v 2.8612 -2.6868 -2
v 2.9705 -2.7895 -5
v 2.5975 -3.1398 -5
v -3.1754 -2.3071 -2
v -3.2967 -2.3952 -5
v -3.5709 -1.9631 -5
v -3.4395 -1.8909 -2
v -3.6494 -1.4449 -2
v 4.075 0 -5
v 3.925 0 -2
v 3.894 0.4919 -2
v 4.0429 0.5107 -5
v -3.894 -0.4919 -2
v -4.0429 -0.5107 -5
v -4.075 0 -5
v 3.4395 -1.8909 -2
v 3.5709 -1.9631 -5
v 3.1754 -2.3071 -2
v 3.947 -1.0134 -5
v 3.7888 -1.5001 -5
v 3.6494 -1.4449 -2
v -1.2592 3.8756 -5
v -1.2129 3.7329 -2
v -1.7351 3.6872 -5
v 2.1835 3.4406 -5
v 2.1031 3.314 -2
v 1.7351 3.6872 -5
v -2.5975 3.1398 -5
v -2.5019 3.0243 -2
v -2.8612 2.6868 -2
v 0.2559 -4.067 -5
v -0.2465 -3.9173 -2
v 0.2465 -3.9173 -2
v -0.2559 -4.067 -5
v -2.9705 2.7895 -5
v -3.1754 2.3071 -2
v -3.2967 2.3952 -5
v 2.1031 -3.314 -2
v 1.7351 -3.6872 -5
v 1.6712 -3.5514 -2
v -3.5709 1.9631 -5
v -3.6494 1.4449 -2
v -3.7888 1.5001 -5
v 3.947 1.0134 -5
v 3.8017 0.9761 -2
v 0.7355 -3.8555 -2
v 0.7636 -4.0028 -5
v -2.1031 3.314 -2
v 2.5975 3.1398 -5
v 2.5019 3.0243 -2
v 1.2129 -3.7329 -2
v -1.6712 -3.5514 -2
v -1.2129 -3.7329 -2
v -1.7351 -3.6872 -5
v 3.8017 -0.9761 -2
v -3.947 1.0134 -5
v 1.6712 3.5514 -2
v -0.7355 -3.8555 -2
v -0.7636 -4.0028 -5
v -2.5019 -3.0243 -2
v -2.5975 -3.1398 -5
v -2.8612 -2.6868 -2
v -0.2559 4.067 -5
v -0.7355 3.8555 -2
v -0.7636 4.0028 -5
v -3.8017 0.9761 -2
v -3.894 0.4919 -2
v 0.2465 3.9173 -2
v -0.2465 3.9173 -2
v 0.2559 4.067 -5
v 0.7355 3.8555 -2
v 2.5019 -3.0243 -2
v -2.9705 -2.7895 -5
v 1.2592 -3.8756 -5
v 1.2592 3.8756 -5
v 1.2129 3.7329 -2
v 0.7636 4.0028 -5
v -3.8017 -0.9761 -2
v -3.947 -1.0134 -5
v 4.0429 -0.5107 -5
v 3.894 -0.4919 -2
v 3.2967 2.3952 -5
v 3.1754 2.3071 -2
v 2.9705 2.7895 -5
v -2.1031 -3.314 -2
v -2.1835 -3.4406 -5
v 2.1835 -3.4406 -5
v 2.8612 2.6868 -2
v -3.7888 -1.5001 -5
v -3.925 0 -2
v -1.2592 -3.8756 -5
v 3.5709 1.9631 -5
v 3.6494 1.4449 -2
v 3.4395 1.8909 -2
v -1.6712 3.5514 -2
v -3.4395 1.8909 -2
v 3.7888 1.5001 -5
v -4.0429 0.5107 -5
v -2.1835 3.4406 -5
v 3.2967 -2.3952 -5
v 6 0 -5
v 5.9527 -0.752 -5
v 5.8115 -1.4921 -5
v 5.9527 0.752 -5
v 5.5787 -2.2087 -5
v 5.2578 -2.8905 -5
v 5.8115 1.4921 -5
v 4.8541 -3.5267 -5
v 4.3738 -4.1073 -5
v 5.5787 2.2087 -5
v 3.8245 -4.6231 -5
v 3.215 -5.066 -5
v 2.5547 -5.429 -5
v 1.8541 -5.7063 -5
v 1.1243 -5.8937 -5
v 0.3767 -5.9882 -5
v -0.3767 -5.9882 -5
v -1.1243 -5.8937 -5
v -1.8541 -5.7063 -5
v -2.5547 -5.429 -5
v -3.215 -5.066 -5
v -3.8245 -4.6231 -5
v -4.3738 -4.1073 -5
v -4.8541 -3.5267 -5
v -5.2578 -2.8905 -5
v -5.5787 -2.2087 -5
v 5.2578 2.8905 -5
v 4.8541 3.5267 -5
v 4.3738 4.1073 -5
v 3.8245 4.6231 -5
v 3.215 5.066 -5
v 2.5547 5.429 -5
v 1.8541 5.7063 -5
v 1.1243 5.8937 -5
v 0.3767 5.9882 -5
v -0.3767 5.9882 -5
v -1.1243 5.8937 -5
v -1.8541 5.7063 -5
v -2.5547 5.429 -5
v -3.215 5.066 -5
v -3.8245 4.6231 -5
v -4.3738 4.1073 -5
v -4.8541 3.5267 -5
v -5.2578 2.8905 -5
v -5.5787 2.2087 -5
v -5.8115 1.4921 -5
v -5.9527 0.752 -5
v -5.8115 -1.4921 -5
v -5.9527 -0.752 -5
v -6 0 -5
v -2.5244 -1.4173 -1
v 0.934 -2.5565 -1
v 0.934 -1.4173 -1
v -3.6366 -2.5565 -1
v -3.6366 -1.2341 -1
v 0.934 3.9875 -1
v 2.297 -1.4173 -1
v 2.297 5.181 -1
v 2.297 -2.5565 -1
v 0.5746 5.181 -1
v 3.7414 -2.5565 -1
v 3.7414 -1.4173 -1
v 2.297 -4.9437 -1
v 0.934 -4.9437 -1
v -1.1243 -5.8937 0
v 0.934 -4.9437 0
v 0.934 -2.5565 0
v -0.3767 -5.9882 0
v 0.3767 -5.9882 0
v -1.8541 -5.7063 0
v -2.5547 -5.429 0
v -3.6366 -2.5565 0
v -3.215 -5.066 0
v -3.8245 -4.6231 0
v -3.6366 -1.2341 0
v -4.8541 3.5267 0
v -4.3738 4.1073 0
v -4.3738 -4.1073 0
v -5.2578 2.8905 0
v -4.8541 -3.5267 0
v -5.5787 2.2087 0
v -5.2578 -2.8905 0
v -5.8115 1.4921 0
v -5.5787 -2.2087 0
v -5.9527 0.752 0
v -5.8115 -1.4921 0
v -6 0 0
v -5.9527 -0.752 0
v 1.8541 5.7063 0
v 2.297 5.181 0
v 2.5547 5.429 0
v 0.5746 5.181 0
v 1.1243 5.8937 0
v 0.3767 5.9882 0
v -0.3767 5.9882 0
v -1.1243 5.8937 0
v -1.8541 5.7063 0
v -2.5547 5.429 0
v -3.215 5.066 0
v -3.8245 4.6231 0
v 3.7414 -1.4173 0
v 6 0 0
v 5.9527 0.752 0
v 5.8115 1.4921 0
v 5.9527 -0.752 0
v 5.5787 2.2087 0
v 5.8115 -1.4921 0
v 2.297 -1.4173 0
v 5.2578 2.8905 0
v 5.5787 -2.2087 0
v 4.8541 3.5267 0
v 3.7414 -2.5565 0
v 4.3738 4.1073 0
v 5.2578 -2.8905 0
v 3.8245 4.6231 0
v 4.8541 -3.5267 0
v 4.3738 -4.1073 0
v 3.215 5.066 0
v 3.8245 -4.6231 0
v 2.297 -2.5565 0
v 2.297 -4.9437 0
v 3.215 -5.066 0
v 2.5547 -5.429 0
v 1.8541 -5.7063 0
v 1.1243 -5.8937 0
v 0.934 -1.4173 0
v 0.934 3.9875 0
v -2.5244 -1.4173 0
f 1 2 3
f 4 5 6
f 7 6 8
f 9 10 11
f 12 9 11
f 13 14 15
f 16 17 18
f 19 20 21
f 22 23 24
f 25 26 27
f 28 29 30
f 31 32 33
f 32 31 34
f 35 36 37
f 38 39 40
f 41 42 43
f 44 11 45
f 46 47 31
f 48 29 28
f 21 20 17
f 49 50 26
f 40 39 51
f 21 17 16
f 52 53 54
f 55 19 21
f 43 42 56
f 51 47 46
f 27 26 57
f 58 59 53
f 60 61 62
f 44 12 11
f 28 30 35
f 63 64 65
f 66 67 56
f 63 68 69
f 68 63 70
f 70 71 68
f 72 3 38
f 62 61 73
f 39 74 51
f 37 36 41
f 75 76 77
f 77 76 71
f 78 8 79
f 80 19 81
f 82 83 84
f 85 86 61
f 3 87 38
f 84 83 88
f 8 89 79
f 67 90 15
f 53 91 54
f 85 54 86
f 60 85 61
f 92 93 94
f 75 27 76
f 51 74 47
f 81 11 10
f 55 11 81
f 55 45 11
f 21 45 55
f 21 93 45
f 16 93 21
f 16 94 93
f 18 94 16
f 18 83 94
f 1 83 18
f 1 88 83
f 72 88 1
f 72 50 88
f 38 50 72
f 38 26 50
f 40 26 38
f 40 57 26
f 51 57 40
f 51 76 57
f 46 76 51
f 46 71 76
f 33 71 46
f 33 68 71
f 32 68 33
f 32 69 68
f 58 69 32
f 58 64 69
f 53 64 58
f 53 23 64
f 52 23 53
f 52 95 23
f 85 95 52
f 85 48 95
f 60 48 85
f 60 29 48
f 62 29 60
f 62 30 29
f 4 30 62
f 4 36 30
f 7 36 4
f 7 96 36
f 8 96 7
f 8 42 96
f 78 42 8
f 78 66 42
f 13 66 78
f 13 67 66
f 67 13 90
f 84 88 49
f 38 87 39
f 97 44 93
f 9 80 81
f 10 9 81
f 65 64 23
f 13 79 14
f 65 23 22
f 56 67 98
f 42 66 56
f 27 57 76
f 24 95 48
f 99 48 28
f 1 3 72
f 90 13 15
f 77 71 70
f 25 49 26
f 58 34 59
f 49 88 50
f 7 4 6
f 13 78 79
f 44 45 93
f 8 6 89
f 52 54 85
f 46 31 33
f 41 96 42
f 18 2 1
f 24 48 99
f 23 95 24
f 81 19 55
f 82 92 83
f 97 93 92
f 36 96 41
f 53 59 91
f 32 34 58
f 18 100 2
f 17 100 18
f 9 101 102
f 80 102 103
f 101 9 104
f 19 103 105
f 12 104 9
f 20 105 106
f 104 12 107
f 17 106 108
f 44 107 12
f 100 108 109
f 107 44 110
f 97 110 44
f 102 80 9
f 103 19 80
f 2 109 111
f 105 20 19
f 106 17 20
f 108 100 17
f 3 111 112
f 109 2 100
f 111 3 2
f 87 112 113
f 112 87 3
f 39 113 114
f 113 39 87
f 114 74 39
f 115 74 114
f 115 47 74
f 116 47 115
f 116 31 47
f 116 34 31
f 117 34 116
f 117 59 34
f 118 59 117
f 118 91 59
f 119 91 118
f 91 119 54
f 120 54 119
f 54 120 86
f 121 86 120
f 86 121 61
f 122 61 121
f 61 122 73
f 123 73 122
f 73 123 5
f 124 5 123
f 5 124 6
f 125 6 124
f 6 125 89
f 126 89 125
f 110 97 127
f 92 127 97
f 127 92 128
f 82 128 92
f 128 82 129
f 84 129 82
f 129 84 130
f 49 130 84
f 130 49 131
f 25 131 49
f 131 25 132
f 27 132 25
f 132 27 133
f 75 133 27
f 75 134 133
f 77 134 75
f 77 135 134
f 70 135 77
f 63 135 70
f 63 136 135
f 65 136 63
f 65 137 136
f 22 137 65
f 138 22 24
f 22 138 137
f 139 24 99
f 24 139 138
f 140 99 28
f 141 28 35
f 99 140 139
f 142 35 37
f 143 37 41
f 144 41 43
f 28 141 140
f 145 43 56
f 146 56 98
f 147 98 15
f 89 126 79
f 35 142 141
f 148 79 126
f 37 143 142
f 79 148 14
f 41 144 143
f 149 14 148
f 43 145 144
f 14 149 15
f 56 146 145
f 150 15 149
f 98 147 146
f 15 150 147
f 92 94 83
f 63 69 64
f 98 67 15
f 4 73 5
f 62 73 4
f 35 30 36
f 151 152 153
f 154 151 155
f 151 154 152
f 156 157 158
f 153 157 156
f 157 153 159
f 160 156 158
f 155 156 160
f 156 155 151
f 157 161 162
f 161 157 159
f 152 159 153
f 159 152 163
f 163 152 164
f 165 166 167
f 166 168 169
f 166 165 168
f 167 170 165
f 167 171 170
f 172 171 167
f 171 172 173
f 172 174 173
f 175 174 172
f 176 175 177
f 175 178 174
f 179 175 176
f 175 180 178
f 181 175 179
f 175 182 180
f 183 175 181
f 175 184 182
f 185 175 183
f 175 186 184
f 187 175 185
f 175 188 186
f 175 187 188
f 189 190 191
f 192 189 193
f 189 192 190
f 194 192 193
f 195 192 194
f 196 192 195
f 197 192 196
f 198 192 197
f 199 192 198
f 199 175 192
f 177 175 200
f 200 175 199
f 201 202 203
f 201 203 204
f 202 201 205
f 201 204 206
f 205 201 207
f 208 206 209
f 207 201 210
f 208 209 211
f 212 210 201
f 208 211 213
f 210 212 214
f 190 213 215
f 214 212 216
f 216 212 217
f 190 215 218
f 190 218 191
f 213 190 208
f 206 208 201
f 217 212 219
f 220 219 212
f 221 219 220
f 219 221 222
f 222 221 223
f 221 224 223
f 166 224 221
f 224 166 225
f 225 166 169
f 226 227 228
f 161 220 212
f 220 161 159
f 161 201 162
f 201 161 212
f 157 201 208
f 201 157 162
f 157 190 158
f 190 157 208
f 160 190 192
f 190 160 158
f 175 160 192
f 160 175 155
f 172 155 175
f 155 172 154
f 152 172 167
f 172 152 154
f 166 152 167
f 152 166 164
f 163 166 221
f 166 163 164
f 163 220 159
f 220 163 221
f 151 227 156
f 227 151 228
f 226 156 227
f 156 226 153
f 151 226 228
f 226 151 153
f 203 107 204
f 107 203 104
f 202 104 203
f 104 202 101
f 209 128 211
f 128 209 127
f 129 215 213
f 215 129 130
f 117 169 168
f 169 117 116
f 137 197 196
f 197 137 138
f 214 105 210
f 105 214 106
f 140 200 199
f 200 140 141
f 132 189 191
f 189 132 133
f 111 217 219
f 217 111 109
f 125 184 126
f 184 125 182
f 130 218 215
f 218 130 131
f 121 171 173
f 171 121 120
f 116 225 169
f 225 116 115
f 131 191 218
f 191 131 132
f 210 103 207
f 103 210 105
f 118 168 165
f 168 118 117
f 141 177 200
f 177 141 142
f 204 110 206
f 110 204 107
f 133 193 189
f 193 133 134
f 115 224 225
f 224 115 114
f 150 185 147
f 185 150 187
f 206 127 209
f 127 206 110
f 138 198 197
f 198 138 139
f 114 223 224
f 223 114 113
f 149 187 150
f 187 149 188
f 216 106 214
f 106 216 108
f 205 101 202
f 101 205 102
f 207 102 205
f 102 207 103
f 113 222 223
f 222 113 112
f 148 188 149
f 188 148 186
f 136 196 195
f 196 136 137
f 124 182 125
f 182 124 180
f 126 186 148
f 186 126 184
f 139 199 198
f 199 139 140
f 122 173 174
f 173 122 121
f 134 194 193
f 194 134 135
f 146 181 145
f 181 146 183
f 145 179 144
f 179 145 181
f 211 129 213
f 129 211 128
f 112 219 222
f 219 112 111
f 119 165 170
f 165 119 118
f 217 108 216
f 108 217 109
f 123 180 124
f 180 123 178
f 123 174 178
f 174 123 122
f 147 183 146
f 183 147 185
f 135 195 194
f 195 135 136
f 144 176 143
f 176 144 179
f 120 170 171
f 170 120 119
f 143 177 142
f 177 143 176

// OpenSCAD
$fn = 50;

difference() {
	union() {
		translate(v = [0, 0, -5.0]) {
			cylinder(h = 5, r = 6.0);
		}
	}
	union() {
		#translate(v = [0, 0, -5.0]) {
			cylinder(h = 3, r1 = 4.075, r2 = 3.925);
		}
		translate(v = [0, 0, -1]) {
			linear_extrude(height = 1) {
				text(font = "Impact", halign = "center", size = 10, text = "4", valign = "center");
			}
		}
	}
}
